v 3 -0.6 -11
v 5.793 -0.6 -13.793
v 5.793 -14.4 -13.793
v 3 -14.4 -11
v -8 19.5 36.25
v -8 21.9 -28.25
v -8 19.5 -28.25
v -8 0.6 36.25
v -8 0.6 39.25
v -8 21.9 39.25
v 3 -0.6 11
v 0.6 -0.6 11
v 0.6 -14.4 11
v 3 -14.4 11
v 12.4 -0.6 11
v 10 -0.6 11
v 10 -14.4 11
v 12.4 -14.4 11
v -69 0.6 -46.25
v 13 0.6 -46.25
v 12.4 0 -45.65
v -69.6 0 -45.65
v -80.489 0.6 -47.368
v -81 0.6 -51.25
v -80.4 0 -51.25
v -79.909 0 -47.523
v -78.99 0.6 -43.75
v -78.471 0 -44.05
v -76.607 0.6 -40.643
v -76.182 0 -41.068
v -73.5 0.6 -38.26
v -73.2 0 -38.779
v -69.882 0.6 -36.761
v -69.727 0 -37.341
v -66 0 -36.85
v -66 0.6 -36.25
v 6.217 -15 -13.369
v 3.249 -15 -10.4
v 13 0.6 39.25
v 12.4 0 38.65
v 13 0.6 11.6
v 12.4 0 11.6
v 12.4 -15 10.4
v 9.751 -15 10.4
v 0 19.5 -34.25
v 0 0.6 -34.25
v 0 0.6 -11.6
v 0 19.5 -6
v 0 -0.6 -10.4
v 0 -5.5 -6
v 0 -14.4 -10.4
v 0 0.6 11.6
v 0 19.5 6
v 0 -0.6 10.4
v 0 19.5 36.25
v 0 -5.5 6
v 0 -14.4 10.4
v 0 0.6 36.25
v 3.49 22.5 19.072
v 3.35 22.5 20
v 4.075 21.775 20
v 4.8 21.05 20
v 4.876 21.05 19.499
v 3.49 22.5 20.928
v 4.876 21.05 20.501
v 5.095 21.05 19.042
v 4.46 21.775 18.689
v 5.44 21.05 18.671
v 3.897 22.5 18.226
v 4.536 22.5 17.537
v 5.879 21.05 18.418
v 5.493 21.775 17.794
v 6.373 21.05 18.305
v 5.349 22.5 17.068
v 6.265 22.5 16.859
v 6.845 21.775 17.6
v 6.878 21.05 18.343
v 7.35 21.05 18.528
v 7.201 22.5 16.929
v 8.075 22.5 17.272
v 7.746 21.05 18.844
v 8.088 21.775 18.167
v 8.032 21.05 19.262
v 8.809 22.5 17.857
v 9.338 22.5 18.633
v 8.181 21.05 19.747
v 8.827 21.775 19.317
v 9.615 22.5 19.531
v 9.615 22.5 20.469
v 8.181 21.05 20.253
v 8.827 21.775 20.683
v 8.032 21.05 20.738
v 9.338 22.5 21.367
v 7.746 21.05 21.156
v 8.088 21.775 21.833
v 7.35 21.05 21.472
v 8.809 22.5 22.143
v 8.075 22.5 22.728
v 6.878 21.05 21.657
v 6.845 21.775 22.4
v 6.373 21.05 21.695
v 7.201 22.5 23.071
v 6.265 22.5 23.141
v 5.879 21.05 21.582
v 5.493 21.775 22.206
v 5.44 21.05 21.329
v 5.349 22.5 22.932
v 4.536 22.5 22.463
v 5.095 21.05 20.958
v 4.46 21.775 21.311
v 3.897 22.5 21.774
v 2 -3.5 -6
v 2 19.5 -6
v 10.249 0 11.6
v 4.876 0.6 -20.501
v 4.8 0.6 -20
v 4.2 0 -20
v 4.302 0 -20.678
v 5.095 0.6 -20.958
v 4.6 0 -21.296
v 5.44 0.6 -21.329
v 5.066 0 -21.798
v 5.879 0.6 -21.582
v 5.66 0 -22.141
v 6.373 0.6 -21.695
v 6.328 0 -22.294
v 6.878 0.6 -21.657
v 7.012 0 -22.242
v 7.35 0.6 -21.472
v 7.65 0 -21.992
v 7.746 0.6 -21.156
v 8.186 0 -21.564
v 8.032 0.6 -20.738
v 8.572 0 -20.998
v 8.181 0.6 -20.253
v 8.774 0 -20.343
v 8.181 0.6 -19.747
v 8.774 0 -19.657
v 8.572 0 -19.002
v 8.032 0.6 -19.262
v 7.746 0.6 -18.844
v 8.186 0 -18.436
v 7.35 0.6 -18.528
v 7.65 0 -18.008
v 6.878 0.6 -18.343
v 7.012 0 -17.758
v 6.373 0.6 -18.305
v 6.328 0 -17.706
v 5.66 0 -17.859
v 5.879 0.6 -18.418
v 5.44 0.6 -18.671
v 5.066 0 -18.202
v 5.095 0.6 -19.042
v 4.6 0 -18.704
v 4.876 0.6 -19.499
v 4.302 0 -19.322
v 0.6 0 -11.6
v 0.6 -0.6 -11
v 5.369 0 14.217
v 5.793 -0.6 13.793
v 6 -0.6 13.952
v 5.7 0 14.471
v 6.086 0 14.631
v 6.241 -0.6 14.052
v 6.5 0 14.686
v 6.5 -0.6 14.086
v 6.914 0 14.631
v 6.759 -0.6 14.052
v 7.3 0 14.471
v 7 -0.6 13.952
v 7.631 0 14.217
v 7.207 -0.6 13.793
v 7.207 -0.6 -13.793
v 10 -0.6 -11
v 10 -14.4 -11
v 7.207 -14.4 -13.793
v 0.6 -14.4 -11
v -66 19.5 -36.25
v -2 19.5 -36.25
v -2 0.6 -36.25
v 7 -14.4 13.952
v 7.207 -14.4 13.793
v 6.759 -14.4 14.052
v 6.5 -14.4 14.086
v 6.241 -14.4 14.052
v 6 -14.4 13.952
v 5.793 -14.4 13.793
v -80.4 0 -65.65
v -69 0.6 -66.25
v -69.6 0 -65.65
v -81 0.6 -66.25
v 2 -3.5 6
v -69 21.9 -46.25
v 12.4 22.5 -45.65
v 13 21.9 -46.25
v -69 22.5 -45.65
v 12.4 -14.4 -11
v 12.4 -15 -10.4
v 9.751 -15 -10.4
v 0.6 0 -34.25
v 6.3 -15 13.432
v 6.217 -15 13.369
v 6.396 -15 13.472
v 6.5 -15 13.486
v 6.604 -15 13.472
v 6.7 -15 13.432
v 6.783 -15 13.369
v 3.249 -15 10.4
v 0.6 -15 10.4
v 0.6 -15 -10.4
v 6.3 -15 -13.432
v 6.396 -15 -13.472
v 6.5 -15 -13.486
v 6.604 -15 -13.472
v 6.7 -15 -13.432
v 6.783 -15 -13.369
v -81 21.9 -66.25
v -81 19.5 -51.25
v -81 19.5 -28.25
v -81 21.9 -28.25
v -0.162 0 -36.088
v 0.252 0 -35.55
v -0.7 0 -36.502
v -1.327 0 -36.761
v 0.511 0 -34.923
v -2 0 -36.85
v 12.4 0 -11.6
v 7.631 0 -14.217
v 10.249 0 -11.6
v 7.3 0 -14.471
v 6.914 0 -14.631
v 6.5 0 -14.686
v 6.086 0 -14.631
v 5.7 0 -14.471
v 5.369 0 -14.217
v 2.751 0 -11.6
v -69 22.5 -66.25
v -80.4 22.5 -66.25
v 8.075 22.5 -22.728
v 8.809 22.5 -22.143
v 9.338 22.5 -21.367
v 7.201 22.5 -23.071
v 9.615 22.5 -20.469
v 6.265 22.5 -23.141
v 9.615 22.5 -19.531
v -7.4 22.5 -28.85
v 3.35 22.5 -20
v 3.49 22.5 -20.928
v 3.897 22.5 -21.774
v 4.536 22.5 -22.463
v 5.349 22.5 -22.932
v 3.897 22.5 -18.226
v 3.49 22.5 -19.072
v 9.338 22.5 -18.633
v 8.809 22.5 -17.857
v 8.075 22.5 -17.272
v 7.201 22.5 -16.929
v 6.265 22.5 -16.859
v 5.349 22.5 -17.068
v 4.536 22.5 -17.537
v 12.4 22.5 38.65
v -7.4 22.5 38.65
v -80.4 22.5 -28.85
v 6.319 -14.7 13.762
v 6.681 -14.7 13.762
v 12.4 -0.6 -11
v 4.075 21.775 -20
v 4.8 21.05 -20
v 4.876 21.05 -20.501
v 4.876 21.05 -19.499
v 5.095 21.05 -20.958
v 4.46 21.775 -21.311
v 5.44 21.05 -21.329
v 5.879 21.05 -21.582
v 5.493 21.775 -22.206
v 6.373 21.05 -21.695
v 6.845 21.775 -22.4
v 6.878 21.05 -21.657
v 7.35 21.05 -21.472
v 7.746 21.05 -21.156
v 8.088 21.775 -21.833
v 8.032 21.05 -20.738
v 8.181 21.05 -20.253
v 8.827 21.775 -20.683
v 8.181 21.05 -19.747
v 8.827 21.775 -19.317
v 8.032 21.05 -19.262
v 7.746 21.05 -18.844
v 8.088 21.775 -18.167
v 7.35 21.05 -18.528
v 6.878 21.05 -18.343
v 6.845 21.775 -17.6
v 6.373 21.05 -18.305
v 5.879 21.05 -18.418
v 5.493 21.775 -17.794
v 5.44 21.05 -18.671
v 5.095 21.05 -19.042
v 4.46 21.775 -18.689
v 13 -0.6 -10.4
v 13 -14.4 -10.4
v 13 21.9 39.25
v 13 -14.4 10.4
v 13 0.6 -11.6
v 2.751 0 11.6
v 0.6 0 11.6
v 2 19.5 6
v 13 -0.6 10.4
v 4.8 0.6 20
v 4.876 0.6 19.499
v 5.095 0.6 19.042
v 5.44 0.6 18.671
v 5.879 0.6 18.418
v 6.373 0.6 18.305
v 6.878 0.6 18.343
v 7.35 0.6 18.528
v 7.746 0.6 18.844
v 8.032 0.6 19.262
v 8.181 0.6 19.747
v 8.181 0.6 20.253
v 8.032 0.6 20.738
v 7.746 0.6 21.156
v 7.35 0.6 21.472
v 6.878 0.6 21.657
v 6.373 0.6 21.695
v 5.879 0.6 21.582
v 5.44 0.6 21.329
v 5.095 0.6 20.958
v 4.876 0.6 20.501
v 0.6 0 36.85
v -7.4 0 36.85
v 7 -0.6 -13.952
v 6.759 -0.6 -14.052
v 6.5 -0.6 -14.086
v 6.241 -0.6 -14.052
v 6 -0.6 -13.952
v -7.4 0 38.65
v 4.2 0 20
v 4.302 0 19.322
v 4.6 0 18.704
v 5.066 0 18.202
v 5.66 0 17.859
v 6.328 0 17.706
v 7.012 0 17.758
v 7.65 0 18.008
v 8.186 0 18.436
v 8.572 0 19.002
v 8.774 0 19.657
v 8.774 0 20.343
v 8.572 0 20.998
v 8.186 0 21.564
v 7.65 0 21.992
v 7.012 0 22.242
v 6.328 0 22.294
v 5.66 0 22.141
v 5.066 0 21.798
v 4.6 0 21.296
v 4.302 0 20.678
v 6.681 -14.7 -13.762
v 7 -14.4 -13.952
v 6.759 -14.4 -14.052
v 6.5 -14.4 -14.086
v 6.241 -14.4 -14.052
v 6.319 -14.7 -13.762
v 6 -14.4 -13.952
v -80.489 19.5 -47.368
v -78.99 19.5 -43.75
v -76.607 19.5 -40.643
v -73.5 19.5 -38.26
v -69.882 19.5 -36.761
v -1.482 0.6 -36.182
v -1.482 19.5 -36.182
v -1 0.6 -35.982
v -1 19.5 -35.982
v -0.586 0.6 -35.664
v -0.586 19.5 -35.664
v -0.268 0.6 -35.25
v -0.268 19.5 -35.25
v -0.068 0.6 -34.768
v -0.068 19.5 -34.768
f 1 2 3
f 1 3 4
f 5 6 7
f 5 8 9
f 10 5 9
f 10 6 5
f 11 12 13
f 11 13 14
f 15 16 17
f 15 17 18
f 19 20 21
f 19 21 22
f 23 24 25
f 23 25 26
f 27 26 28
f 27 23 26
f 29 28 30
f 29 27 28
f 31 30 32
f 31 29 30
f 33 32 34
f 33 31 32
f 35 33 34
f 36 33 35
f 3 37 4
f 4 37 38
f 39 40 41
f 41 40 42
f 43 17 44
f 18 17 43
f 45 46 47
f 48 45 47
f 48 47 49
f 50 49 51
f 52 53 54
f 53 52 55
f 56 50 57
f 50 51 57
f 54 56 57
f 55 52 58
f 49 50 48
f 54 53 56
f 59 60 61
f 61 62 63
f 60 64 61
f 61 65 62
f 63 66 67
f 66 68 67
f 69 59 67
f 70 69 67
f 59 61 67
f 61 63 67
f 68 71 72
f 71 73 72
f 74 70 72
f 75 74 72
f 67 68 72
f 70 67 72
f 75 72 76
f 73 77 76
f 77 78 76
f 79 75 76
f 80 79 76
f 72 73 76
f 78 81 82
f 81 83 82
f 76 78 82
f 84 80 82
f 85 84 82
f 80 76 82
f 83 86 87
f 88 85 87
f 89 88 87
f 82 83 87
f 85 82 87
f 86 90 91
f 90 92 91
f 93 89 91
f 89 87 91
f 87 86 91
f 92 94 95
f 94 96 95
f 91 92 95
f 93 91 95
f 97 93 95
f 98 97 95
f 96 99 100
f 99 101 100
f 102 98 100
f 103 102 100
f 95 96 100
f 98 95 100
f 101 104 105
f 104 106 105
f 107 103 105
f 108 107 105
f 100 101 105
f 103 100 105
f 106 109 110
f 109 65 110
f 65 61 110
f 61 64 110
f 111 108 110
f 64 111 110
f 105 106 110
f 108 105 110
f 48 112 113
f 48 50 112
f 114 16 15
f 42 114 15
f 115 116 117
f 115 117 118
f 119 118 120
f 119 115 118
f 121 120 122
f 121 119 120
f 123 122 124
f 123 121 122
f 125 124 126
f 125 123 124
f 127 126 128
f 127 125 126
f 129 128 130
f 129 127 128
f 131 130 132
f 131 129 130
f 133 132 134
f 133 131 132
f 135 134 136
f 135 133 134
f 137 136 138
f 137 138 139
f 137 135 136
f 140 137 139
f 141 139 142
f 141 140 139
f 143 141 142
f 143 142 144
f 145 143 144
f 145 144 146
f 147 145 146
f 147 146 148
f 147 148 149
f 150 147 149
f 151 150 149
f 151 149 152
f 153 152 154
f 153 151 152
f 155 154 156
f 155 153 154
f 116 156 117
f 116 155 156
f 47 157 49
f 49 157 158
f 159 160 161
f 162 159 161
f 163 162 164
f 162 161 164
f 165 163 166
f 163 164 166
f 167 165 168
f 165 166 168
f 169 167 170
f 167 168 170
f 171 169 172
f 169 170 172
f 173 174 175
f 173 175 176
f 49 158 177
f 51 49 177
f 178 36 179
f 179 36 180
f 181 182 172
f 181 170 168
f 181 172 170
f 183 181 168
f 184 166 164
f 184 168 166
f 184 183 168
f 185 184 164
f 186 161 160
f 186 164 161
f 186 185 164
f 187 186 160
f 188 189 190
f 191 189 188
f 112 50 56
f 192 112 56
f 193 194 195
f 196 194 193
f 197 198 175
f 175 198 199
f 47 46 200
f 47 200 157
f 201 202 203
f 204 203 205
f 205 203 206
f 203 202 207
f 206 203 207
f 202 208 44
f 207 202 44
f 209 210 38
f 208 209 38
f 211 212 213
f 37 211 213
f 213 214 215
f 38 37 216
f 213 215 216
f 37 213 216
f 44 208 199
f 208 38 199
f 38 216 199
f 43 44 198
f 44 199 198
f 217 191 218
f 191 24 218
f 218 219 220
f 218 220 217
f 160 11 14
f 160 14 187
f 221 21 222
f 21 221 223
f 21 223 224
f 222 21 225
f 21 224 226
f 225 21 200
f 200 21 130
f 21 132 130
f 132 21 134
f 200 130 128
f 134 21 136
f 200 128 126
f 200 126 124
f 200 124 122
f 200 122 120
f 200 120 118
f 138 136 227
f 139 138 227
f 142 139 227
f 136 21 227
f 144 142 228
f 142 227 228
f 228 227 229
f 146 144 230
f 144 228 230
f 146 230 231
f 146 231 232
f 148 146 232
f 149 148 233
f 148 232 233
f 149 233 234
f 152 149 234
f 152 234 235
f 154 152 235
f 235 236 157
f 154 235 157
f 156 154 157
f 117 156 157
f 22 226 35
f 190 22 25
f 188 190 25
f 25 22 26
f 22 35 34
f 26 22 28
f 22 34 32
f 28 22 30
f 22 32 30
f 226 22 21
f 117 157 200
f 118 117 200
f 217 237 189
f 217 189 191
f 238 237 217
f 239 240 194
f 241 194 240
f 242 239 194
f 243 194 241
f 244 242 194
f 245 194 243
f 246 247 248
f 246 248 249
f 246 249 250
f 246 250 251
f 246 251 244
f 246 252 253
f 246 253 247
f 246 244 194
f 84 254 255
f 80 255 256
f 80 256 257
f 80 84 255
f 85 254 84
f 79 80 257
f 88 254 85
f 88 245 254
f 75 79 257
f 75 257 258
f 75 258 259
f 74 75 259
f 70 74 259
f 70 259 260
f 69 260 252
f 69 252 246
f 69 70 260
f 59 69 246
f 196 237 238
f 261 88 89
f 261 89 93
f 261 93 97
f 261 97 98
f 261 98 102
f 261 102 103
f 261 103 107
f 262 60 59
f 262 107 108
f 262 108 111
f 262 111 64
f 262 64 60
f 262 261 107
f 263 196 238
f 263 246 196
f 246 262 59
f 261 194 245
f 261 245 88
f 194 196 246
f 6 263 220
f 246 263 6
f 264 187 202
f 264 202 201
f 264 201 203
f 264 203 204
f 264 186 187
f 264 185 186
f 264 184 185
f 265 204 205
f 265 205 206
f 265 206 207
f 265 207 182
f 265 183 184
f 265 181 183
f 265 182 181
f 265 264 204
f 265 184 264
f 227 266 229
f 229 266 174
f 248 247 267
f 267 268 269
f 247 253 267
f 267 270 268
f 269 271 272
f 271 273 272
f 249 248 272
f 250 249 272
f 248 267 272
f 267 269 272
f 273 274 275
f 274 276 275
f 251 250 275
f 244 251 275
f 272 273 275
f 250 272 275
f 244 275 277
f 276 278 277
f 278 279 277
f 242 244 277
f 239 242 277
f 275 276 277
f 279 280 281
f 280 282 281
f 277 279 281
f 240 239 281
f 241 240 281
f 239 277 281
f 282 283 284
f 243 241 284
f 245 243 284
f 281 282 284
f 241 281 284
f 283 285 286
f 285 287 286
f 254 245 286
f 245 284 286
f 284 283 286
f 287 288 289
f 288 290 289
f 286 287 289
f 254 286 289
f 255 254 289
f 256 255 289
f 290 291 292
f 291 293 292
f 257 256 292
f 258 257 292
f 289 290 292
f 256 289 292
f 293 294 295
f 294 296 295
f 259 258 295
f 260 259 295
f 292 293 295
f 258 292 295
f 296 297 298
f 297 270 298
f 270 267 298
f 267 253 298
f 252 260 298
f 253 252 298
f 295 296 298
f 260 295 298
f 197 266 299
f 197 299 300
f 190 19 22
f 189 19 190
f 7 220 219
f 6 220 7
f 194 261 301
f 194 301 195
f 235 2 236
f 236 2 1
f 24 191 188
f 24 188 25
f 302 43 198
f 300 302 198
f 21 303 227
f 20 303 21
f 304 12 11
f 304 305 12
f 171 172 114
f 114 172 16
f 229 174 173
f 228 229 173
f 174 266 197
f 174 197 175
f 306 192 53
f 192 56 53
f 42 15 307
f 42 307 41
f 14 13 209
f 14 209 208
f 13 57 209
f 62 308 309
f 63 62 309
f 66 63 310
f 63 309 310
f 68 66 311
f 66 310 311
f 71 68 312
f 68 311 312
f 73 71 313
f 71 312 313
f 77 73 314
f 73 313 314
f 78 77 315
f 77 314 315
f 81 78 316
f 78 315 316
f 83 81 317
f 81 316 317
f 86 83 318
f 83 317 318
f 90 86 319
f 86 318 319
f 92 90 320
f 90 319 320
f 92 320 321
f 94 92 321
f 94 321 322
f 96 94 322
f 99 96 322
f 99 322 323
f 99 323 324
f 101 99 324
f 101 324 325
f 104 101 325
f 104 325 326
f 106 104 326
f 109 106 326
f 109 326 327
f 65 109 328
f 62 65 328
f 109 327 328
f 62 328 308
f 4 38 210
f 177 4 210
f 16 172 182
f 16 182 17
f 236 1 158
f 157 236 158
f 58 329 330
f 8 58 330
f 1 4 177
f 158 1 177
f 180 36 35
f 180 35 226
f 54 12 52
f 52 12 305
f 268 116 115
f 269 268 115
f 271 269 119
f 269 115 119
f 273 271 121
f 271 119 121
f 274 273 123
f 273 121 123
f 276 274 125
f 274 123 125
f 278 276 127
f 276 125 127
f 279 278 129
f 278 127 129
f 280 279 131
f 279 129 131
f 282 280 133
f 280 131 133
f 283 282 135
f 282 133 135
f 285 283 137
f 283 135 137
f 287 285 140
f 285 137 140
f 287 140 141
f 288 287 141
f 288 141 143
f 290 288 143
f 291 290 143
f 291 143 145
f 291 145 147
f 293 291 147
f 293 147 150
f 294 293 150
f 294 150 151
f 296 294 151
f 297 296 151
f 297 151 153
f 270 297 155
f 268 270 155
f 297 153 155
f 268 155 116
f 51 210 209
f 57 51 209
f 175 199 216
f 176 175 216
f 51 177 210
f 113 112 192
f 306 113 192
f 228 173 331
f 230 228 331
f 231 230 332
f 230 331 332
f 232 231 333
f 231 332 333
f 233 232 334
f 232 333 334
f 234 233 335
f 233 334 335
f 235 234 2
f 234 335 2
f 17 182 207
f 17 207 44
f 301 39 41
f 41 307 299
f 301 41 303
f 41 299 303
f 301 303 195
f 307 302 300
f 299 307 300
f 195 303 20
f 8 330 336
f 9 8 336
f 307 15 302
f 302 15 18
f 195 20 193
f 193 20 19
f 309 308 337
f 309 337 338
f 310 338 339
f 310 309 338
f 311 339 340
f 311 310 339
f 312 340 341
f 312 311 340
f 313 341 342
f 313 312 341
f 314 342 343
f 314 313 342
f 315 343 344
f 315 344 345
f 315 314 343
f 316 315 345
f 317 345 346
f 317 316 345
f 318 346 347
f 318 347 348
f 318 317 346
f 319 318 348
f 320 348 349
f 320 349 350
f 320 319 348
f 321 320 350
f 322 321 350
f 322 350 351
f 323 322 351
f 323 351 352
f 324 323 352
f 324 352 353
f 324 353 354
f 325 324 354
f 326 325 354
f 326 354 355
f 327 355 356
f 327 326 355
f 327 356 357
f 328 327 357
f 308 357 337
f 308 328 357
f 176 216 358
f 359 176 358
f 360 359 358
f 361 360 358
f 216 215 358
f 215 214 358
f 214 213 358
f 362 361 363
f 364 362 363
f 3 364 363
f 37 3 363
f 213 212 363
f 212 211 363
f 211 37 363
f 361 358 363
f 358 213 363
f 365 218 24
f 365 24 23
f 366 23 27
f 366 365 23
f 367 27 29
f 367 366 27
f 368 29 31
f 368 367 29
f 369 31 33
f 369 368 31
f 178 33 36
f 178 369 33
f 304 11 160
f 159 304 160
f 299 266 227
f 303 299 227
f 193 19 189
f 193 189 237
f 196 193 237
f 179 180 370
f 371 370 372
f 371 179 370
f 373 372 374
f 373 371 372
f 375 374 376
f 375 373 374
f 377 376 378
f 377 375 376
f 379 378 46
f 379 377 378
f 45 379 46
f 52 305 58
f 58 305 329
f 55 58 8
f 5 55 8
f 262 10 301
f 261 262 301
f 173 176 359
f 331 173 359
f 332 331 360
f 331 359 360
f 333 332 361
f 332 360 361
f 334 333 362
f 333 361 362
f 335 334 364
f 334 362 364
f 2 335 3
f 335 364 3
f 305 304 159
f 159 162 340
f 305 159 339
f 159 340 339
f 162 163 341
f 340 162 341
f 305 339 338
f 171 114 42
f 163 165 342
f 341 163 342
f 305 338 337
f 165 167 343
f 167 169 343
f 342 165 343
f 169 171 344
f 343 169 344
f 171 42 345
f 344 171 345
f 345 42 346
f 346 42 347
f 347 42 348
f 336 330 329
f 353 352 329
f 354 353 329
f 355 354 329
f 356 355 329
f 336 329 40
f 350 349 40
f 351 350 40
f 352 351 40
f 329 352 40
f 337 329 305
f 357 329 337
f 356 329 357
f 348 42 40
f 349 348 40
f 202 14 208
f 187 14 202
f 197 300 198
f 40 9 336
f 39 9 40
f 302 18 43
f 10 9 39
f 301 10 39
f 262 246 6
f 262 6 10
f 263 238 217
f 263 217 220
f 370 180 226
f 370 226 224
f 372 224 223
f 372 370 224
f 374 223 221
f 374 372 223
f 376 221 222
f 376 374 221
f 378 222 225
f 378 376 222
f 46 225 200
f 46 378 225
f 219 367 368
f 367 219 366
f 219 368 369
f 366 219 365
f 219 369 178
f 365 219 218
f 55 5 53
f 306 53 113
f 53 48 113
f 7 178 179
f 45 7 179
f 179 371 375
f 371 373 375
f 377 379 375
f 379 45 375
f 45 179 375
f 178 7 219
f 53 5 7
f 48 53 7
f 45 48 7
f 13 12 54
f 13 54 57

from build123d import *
from OCP.BRepFilletAPI import BRepFilletAPI_MakeFillet

# Parameters (mm, degrees)
BOSS_EXTRUDE1_DEPTH                                 = 15
BOSS_EXTRUDE2_DEPTH                                 = 22.5
SKETCH3_W                                           = 8
SKETCH3_H                                           = 3
BOSS_EXTRUDE3_DEPTH                                 = 3
SKETCH8_W                                           = 12
SKETCH8_H                                           = 25
CUT_EXTRUDE1_DEPTH                                  = 2
CSK_FOR_M3_COUNTERSUNK_FLAT_HEAD_SCREW1_D           = 3.4
CSK_FOR_M3_COUNTERSUNK_FLAT_HEAD_SCREW1_CSINK_D     = 6.3
CSK_FOR_M3_COUNTERSUNK_FLAT_HEAD_SCREW1_CSINK_ANGLE = 90
SKETCH9_W                                           = 12
SKETCH9_H                                           = 22.5
BOSS_EXTRUDE4_DEPTH                                 = 20
FILLET1_R                                           = 15
FILLET2_R1                                          = 1
FILLET2_R2                                          = 2
CHAMFER1_SIZE                                       = 0.6
CHAMFER2_SIZE                                       = 2


with BuildPart() as part:
    # Sketch1 → Boss-Extrude1 (new body)
    with BuildSketch(Plane(origin=(0, 0, 0), x_dir=(1, 0, 0), z_dir=(0, 1, 0))):
        Polygon((6.5, 14.5), (3, 11), (0, 11), (0, -11), (3, -11), (6.5, -14.5), (10, -11), (13, -11), (13, 11), (10, 11), align=None)
    extrude(amount=-BOSS_EXTRUDE1_DEPTH)

    # Sketch2 → Boss-Extrude2 (add)
    with BuildSketch(Plane(origin=(0, 0, 0), x_dir=(1, 0, 0), z_dir=(0, 1, 0))):
        Polygon((0, -39.25), (13, -39.25), (13, -11), (10, -11), (6.5, -14.5), (3, -11), (0, -11), align=None)
        Polygon((10, 11), (13, 11), (13, 46.25), (-81, 46.25), (-81, 36.25), (0, 36.25), (0, 11), (3, 11), (6.5, 14.5), align=None)
        Polygon((3, 11), (0, 11), (0, -11), (3, -11), (6.5, -14.5), (10, -11), (13, -11), (13, 11), (10, 11), (6.5, 14.5), align=None)
    extrude(amount=BOSS_EXTRUDE2_DEPTH)

    # Sweep1: sweep along a curve in space
    with BuildLine() as sweep1_path:
        Line((0, 22.5, 39.25), (0, 0, 39.25))
    # Sketch3 → Sweep1 (sweep)
    with BuildSketch(Plane(origin=(0, 22.5, 0), x_dir=(1, 0, 0), z_dir=(0, 1, 0))):
        with Locations((-4, -37.75)):
            Rectangle(SKETCH3_W, SKETCH3_H)
    sweep(path=sweep1_path.line)

    # Sketch4 → Boss-Extrude3 (add)
    with BuildSketch(Plane(origin=(0, 22.5, 0), x_dir=(1, 0, 0), z_dir=(0, 1, 0))):
        Polygon((-8, -36.25), (0, -36.25), (0, 36.25), (-81, 36.25), (-81, 28.25), (-8, 28.25), align=None)
    extrude(amount=-BOSS_EXTRUDE3_DEPTH)

    # Sketch8 → Cut-Extrude1 (cut)
    with BuildSketch(Plane.ZY):
        with Locations((0, 7)):
            Rectangle(SKETCH8_W, SKETCH8_H)
    extrude(amount=-CUT_EXTRUDE1_DEPTH, mode=Mode.SUBTRACT)

    # CSK for M3 Countersunk Flat Head Screw1 (through all)
    with Locations(Plane(origin=(0, 22.5, 0), x_dir=(1, 0, 0), z_dir=(0, 1, 0))):
        with Locations((6.5, 20), (6.5, -20)):
            CounterSinkHole(CSK_FOR_M3_COUNTERSUNK_FLAT_HEAD_SCREW1_D / 2, CSK_FOR_M3_COUNTERSUNK_FLAT_HEAD_SCREW1_CSINK_D / 2, counter_sink_angle=CSK_FOR_M3_COUNTERSUNK_FLAT_HEAD_SCREW1_CSINK_ANGLE)

    # Sketch9 → Boss-Extrude4 (add)
    with BuildSketch(Plane(origin=(0, 0, -46.25), x_dir=(-1, 0, 0), z_dir=(0, 0, -1))):
        with Locations((75, 11.25)):
            Rectangle(SKETCH9_W, SKETCH9_H)
    extrude(amount=BOSS_EXTRUDE4_DEPTH)

    # Fillet1
    fillet1_edges = [part.edges().sort_by_distance(p)[0] for p in [
        (-81, 9.75, -36.25),
    ]]
    fillet(fillet1_edges, radius=FILLET1_R)

    # Fillet2: one fillet with a radius per group of edges: ONE call of the kernel's fillet builder (fillet() takes one radius for all edges)
    fillet2_edges_1 = [part.edges().sort_by_distance(p)[0] for p in [
        (6.5, -7.5, -14.5),
        (6.5, -7.5, 14.5),
    ]]
    fillet2_edges_2 = [part.edges().sort_by_distance(p)[0] for p in [
        (0, 9.75, -36.25),
    ]]
    fillet2 = BRepFilletAPI_MakeFillet(part.part.solid().wrapped)
    for e in fillet2_edges_1:
        fillet2.Add(FILLET2_R1, e.wrapped)
    for e in fillet2_edges_2:
        fillet2.Add(FILLET2_R2, e.wrapped)
    add(Compound.cast(fillet2.Shape()), mode=Mode.REPLACE)

    # Chamfer1
    chamfer1_edges = [part.edges().sort_by_distance(p)[0] for p in [
        (1.5, 0, -11),
        (8.2, 0, -20),
        (8.603553391, 0, -12.396446609),
        (8.2, 0, 20),
        (11.5, 0, -11),
        (-69, 0, -56.25),
        (-75, 0, -66.25),
        (11.5, 0, 11),
        (4.396446609, -15, 12.396446609),
        (4.396446609, 0, 12.396446609),
        (-76.606601718, 0, -40.643398282),
        (1.5, 0, 11),
        (-34, 0, -36.25),
        (4.396446609, 0, -12.396446609),
        (4.396446609, -15, -12.396446609),
        (8.603553391, -15, 12.396446609),
        (6.5, -15, 14.085786438),
        (6.5, -15, -14.085786438),
        (8.603553391, 0, 12.396446609),
        (-0.585786438, 0, -35.664213562),
        (6.5, 0, -14.085786438),
        (6.5, 0, 14.085786438),
        (0, -7.5, -11),
        (13, -7.5, -11),
        (13, -7.5, 11),
        (0, -7.5, 11),
        (11.5, -15, 11),
        (13, -15, 0),
        (11.5, -15, -11),
        (2.5, 0, 39.25),
        (8.603553391, -15, -12.396446609),
        (0, 0, -22.625),
        (2.5, 22.5, 39.25),
        (13, 0, 25.125),
        (13, 0, -28.625),
        (-28, 0, -46.25),
        (-81, 0, -58.75),
        (13, 22.5, -3.5),
        (-28, 22.5, -46.25),
        (-81, 22.5, -47.25),
        (1.5, -15, -11),
        (0, -15, 0),
        (0, 0, 23.625),
        (-8, 22.5, 5.5),
        (-4, 0, 36.25),
        (-8, 0, 37.75),
        (-44.5, 22.5, -28.25),
        (1.5, -15, 11),
    ]]
    chamfer(chamfer1_edges, length=CHAMFER1_SIZE)

    # Chamfer2
    chamfer2_edges = [part.edges().sort_by_distance(p)[0] for p in [
        (2, -5.5, 0),
    ]]
    chamfer(chamfer2_edges, length=CHAMFER2_SIZE - 0.0001)  # a hair under: the kernel refuses the full size


solid = part.part
